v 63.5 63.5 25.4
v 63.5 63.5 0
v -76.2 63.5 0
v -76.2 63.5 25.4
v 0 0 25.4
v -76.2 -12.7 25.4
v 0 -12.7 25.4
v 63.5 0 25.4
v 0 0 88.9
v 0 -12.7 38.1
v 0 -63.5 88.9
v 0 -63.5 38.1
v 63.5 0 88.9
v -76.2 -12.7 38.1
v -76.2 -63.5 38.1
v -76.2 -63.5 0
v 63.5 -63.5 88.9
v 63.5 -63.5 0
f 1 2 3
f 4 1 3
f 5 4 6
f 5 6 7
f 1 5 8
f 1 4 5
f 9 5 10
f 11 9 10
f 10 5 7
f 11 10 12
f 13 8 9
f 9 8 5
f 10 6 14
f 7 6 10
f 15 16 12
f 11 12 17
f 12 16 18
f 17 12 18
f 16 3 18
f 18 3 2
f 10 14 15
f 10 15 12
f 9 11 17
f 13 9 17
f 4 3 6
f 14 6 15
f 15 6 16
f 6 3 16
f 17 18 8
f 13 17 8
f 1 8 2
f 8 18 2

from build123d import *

# Parameters (mm, degrees)
F1_DEPTH = 88.9
F0_W     = 76.2
F0_H     = 50.8
F2_DEPTH = 38.1
F3_DEPTH = 25.4


with BuildPart() as f1:
    # F0 (on Top) → F1 (new body)
    with BuildSketch(Plane.XY):
        Polygon((0, -63.5), (63.5, -63.5), (63.5, 0), (0, 0), (0, -12.7), align=None)
    extrude(amount=F1_DEPTH)

    # F0 (on Top) → F2 (join)
    with BuildSketch(Plane.XY):
        with Locations((-38.1, -38.1)):
            Rectangle(F0_W, F0_H)
    extrude(amount=F2_DEPTH)

    # F0 (on Top) → F3 (join)
    with BuildSketch(Plane.XY):
        Polygon((0, 0), (63.5, 0), (63.5, 63.5), (-76.2, 63.5), (-76.2, -12.7), (0, -12.7), align=None)
    extrude(amount=F3_DEPTH)


solid = f1.part
